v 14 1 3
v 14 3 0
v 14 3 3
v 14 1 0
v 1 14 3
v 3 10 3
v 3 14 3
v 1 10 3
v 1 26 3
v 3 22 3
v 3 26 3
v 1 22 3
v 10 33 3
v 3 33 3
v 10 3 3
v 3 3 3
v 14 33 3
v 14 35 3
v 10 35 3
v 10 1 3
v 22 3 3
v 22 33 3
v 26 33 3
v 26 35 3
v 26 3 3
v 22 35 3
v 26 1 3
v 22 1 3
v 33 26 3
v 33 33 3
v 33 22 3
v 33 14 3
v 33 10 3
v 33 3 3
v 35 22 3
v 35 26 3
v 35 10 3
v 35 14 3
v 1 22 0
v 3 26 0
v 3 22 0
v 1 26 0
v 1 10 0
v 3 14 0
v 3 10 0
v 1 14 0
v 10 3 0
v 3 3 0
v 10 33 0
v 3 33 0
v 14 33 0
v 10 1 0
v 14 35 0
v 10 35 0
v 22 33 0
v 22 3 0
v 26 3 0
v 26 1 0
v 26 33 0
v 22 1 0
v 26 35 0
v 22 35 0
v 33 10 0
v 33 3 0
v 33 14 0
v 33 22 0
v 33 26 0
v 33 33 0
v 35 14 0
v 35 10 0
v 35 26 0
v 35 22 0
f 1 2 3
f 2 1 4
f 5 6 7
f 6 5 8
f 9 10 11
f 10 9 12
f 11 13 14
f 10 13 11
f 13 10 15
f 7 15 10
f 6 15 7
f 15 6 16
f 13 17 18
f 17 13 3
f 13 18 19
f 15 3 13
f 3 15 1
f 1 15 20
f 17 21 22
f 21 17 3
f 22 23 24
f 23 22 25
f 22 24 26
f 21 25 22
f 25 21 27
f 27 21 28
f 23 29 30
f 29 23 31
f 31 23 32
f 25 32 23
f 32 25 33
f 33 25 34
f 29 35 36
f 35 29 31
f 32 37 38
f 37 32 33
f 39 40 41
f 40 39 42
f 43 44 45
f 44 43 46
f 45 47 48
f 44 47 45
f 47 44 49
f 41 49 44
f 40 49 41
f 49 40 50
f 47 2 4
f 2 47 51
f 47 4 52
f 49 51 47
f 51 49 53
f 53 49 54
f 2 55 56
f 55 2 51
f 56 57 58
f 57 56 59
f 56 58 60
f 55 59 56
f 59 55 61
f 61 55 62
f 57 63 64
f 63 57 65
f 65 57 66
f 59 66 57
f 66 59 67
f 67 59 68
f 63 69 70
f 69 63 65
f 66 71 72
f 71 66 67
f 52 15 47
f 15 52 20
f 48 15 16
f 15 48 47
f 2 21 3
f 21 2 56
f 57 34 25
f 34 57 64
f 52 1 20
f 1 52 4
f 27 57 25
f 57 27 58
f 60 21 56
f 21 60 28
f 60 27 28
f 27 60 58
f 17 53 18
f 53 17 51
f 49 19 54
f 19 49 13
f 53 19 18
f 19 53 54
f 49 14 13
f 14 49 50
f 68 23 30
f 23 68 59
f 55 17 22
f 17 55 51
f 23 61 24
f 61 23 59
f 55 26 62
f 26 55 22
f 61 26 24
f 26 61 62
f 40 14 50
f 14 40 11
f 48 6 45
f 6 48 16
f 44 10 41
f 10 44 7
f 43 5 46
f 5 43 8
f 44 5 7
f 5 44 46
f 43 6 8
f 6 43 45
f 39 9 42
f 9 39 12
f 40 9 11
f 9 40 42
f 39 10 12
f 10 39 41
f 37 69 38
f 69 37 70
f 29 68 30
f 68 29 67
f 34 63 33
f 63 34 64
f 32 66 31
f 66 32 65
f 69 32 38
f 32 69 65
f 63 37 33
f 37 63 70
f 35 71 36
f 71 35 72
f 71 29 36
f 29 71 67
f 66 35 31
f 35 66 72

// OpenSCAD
side = 36;
lct = 3 ; //laser cut sheet thickness
tol = 1; //tolerance
union(){
        translate([lct,lct,0])cube([side-2*lct,side-2*lct,lct]);  //the center cube
        for(x=[lct+6+tol:12:side-lct-1])translate([x,tol,0])cube([6-2*tol,lct-tol,lct]); //bottom
        for(x=[lct+6+tol:12:side-lct-1])translate([x,side-lct,0])cube([6-2*tol,lct-tol,lct]); //top
        for(y=[lct+6+tol:12:side-lct-1])translate([tol,y,0])cube([lct-tol,6-2*tol,lct]); //left
        for(y=[lct+6+tol:12:side-lct-1])translate([side-lct,y,0])cube([lct-tol,6-2*tol,lct]);  //right
        }
